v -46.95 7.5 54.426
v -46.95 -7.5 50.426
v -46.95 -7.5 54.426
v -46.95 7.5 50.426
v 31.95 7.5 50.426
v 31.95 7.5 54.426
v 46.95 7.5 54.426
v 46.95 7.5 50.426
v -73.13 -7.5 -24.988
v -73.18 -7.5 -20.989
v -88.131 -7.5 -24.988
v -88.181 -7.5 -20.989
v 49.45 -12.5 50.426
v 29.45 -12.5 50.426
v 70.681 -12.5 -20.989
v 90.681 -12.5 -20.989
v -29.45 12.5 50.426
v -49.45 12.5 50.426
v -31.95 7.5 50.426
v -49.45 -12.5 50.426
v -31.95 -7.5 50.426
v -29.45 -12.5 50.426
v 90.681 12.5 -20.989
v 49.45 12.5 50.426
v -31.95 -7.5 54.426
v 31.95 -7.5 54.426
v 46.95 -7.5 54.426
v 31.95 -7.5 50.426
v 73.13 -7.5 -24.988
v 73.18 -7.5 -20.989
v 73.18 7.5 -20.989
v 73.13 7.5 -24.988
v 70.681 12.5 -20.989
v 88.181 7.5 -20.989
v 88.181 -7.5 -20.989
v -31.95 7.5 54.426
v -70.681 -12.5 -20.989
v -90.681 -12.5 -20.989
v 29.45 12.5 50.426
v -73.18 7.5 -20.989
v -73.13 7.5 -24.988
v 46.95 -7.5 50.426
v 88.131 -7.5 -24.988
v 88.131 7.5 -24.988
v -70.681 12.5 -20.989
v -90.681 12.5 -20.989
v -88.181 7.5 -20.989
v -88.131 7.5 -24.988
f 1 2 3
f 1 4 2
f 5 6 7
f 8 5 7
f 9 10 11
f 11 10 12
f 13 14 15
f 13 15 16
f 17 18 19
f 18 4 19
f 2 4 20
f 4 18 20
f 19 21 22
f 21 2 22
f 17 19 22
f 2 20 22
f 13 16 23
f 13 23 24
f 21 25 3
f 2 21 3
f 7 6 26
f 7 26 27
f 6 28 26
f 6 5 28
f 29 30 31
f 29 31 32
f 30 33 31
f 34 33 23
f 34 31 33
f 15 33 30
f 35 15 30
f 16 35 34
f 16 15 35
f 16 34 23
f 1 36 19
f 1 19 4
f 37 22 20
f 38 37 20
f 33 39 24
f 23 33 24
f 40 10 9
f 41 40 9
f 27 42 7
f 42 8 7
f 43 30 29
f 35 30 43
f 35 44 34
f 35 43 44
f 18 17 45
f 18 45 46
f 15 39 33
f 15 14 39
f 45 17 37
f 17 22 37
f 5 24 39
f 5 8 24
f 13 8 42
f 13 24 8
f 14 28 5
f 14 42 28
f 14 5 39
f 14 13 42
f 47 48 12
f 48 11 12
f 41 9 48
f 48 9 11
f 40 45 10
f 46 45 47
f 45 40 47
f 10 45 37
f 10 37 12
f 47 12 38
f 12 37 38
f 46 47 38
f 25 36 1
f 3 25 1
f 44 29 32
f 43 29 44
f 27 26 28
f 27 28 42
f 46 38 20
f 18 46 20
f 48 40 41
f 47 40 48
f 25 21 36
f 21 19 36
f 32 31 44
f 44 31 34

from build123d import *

# Parameters (mm, degrees)
F1_DEPTH = 12.5
F0_W     = 15
F0_H     = 4
F2_DEPTH = 7.5


with BuildPart() as f1:
    # F0 (on Front) → F1 (new body, symmetric)
    with BuildSketch(Plane.XZ):
        Polygon((31.949712, 50.425649), (29.449712, 50.425649), (70.680769, -20.988636), (73.18017, -20.988636), (88.181367, -20.988636), (90.680769, -20.988636), (49.449712, 50.425649), (46.949712, 50.425649), align=None)
    extrude(amount=F1_DEPTH, both=True)

    # F0 (on Front) → F2 (join, symmetric)
    with BuildSketch(Plane.XZ):
        with Locations((39.449712, 52.425649)):
            Rectangle(F0_W, F0_H)
        Polygon((88.181367, -20.988636), (73.18017, -20.988636), (73.129631, -24.988316), (88.130829, -24.988316), align=None)
    extrude(amount=F2_DEPTH, both=True)


with BuildPart() as f3_1:
    # F3: instance of F1
    add(f1.part.mirror(Plane.YZ))


solid = Compound([f1.part, f3_1.part])
